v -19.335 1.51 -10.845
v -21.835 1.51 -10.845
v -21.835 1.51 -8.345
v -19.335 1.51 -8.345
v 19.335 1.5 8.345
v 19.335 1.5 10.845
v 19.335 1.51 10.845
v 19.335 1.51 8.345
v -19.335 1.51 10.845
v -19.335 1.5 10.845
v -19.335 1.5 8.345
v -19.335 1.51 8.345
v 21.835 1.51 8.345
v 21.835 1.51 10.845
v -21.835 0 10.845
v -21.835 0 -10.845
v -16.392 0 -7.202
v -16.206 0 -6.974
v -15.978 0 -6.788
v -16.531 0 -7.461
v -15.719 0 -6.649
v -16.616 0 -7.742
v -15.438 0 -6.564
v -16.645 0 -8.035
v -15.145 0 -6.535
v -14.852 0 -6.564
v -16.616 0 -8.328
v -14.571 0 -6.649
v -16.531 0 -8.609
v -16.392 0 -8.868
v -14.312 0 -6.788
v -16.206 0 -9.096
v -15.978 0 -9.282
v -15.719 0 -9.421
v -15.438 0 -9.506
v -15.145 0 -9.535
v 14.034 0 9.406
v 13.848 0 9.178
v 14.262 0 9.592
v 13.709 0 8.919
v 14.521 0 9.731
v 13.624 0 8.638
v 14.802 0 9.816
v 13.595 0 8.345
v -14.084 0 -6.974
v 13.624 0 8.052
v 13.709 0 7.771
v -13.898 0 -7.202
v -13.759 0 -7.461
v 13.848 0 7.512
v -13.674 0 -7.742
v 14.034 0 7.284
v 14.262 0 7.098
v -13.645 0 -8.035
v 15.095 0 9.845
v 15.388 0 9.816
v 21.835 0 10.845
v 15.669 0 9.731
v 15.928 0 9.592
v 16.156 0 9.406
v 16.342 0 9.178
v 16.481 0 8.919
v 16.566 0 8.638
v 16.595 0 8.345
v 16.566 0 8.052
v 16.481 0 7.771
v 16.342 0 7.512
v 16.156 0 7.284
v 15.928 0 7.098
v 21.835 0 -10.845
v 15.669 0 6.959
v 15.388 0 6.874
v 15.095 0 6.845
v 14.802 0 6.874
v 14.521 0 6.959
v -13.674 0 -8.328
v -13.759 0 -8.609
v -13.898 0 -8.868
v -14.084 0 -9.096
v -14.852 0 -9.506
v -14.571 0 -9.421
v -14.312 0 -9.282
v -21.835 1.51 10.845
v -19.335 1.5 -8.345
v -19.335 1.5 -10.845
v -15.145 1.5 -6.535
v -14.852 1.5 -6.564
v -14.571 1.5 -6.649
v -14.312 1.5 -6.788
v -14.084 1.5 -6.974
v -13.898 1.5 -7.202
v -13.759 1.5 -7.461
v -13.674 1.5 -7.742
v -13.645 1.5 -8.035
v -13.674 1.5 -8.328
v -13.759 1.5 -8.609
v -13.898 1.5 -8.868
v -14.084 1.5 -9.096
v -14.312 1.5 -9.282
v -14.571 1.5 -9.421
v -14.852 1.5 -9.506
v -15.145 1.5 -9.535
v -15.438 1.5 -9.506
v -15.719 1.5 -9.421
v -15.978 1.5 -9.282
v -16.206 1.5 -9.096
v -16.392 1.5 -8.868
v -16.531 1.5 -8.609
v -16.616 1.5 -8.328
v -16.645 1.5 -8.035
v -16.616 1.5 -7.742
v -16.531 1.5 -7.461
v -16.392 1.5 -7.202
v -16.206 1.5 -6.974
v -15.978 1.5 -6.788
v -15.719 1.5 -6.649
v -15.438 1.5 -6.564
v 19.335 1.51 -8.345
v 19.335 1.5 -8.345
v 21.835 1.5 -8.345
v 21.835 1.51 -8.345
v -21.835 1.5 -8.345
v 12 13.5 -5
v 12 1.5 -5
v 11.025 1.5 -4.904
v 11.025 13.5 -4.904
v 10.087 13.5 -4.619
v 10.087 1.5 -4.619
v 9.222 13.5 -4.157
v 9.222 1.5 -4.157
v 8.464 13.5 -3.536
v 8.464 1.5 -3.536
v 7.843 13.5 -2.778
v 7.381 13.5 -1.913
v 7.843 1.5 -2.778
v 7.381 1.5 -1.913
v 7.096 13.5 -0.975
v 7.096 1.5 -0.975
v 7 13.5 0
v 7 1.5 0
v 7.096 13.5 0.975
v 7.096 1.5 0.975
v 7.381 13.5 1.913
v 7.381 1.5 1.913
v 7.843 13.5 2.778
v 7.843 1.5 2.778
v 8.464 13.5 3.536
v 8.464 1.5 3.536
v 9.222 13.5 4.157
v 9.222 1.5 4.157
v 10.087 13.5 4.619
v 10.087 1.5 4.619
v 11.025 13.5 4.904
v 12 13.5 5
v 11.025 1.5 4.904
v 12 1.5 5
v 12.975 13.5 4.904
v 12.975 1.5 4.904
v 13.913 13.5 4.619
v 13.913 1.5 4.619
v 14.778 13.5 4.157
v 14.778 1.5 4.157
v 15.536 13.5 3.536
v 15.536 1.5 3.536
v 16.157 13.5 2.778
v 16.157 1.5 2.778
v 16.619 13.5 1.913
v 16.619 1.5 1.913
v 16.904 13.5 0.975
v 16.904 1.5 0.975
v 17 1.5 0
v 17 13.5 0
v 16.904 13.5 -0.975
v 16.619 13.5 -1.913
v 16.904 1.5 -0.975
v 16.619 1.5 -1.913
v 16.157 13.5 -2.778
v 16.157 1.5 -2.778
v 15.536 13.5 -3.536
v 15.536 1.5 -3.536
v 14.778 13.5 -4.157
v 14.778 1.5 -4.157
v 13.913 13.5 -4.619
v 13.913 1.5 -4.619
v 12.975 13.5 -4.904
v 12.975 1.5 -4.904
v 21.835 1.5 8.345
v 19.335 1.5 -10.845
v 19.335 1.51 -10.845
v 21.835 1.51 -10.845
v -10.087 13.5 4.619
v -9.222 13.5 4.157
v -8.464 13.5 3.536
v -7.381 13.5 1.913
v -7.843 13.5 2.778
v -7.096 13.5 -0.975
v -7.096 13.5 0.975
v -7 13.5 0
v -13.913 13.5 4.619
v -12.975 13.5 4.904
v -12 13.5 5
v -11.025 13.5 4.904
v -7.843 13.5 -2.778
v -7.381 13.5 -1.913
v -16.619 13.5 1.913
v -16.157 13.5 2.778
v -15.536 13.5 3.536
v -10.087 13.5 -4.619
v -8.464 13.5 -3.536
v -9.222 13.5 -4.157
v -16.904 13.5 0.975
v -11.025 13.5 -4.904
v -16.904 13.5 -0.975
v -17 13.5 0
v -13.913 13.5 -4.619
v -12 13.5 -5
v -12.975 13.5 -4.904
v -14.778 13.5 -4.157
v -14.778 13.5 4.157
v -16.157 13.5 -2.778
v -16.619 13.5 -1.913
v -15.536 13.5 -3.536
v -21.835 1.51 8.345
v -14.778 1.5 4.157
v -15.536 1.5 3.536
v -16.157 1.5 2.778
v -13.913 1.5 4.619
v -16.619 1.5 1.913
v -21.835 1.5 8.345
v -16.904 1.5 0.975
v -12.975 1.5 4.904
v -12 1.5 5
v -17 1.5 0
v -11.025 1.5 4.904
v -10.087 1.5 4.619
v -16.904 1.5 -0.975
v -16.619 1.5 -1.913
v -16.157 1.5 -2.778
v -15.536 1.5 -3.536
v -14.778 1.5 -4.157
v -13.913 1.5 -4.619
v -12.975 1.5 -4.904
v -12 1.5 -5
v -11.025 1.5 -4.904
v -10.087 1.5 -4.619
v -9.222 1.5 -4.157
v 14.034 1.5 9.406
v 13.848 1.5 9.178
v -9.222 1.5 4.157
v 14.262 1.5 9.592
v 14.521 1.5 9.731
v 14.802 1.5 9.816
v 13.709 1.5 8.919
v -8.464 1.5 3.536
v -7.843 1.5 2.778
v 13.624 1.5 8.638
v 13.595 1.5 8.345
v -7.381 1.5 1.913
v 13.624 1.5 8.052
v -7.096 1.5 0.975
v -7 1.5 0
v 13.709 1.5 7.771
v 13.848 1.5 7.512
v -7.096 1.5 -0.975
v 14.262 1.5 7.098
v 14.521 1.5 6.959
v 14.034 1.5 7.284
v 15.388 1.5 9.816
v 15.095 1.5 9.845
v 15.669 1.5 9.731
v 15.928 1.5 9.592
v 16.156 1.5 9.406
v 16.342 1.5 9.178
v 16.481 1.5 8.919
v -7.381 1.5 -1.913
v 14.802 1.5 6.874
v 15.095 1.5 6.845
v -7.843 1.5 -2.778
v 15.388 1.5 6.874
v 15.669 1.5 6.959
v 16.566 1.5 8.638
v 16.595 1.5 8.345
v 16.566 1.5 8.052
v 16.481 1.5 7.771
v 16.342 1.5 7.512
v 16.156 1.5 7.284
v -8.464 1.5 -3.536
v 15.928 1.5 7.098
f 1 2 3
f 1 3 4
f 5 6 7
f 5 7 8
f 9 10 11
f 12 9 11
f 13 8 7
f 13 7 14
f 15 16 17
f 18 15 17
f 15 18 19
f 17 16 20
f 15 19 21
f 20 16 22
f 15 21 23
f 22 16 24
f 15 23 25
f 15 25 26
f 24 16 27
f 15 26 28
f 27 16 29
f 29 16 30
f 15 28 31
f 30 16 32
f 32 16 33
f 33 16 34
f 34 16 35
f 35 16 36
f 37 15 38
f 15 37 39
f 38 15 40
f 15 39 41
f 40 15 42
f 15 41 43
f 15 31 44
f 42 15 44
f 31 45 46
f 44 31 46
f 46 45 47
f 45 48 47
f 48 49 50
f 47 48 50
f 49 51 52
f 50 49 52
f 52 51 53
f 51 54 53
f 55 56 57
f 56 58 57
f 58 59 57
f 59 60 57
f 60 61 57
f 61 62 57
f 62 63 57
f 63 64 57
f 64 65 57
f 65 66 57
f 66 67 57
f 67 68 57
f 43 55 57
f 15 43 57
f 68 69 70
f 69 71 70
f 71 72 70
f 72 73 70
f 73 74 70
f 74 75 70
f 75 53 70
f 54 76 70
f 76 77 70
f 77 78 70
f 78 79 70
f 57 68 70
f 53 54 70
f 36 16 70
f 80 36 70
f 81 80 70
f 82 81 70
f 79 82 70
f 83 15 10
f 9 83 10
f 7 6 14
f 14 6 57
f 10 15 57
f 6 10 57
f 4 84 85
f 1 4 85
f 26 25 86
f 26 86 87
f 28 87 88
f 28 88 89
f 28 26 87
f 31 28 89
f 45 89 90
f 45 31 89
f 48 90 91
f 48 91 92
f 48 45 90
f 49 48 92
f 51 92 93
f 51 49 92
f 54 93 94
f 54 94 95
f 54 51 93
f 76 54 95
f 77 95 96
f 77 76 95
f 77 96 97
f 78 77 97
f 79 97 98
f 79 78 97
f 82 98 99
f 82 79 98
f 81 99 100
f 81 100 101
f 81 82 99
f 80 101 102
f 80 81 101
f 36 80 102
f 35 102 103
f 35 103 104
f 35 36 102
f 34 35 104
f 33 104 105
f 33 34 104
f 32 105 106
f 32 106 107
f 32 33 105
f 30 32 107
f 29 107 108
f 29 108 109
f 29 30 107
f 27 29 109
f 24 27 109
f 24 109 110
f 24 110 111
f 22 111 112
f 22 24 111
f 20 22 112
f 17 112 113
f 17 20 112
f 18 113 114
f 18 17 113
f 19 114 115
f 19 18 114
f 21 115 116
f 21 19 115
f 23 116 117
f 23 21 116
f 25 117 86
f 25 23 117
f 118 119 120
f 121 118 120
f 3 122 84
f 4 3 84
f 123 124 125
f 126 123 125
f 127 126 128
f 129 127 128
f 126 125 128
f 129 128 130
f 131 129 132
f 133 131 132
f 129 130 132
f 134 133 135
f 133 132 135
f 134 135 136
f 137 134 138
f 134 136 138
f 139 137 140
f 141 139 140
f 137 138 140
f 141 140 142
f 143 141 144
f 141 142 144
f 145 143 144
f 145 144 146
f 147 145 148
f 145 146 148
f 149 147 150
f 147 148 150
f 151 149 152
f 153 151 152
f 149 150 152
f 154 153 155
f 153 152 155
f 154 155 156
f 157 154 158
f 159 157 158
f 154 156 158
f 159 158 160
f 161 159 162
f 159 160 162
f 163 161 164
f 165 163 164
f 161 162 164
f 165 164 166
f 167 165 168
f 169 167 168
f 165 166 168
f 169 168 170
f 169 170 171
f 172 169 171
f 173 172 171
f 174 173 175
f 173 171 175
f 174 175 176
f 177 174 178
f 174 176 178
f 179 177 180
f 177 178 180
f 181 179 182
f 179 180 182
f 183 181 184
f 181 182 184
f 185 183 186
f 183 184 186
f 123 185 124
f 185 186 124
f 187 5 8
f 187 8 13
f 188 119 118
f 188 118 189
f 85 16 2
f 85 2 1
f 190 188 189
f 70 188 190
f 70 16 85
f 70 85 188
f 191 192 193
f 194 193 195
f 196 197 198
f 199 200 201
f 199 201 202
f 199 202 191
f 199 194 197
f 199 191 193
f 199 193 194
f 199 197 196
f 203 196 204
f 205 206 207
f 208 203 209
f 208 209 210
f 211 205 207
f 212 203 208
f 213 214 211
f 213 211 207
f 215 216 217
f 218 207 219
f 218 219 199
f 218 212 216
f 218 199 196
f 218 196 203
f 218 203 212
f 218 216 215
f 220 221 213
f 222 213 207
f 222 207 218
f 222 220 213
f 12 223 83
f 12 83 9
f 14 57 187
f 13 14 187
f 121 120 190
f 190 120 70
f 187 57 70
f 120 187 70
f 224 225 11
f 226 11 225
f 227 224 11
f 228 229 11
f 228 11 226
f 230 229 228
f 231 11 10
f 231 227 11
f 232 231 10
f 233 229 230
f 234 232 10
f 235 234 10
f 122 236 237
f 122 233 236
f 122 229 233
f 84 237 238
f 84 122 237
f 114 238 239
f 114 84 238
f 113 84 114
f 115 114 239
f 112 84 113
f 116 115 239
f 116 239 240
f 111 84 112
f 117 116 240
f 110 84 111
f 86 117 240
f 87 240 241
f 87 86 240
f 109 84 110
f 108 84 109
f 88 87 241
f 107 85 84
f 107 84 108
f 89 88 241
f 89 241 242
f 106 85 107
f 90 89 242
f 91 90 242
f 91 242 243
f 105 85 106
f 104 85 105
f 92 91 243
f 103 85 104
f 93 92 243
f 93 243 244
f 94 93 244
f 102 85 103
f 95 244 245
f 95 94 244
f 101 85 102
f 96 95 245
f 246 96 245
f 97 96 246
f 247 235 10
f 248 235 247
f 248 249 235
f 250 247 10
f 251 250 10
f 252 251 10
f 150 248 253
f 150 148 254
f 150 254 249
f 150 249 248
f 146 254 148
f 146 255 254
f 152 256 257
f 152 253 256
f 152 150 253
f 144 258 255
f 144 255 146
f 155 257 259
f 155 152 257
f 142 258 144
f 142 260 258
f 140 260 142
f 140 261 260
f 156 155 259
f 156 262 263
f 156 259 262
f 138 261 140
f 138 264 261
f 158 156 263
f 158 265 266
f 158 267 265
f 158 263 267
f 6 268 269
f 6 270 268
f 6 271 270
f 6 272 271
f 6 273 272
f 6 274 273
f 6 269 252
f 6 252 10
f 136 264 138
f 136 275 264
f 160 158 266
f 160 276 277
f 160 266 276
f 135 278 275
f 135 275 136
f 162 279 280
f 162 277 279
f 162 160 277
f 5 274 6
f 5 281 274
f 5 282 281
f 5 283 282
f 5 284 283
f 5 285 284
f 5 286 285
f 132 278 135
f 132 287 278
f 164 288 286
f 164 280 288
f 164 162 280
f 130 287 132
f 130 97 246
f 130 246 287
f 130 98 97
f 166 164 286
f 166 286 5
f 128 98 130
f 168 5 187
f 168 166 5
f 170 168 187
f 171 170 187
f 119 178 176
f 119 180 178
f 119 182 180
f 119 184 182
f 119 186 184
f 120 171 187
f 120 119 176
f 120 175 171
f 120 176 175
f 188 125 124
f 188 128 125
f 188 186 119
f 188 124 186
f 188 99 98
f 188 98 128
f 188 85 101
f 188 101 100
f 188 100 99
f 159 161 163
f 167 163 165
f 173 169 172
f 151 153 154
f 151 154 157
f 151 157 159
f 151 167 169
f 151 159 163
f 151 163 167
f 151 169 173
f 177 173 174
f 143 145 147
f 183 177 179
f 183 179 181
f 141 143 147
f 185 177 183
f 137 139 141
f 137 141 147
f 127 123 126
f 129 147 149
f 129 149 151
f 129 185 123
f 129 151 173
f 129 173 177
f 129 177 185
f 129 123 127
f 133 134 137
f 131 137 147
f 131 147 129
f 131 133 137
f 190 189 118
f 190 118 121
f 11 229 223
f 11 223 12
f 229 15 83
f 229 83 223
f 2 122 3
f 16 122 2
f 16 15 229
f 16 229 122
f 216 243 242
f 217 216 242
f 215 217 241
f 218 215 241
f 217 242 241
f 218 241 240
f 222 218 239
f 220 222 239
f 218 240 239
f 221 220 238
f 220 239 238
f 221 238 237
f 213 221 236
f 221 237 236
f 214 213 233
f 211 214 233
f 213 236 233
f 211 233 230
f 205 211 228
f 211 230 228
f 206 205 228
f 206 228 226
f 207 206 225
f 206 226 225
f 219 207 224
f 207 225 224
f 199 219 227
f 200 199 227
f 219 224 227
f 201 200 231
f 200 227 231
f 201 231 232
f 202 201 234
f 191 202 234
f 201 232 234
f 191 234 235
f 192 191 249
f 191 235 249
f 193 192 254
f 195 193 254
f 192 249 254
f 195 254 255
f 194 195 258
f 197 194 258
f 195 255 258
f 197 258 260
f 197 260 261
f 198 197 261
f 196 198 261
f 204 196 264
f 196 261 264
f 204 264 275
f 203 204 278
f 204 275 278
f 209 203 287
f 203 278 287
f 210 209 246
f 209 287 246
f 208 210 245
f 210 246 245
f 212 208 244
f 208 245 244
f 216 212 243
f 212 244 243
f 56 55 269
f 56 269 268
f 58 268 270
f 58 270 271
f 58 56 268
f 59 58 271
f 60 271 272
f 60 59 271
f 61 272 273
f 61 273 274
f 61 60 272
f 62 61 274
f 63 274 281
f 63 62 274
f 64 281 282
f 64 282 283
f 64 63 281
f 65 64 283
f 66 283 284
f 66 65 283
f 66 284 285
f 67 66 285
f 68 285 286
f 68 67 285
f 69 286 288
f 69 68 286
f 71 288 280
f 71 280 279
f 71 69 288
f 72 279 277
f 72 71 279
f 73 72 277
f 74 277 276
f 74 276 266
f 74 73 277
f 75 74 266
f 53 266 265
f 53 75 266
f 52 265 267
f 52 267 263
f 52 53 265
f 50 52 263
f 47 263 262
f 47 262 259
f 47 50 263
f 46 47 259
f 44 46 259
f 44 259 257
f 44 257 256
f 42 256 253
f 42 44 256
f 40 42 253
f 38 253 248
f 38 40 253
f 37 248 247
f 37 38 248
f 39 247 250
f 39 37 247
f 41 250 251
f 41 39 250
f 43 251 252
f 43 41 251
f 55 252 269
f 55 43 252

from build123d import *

# Parameters (mm, degrees)
SKETCH1_W           = 43.67
SKETCH1_H           = 21.69
SKETCH1_R           = 1.5
BOSS_EXTRUDE1_DEPTH = 1.5
SKETCH2_W           = 2.5
SKETCH2_H           = 2.5
BOSS_EXTRUDE2_DEPTH = 0.01
SKETCH3_W           = 2.5
SKETCH3_H           = 2.5
BOSS_EXTRUDE3_DEPTH = 0.01
SKETCH4_R           = 5
BOSS_EXTRUDE4_DEPTH = 12


with BuildPart() as part:
    # Sketch1 → Boss-Extrude1 (new body)
    with BuildSketch(Plane(origin=(0, 0, 0), x_dir=(1, 0, 0), z_dir=(0, 1, 0))):
        Rectangle(SKETCH1_W, SKETCH1_H)
        with Locations(Location((-15.145, 8.035, 0), (0, 0, 270))):
            Circle(SKETCH1_R, mode=Mode.SUBTRACT)
        with Locations(Location((15.095, -8.345, 0), (0, 0, 270))):
            Circle(SKETCH1_R, mode=Mode.SUBTRACT)
    extrude(amount=BOSS_EXTRUDE1_DEPTH)

    # Sketch2 → Boss-Extrude2 (add)
    with BuildSketch(Plane(origin=(0, 1.5, 0), x_dir=(1, 0, 0), z_dir=(0, 1, 0))):
        with Locations((-20.585, 9.595)):
            Rectangle(SKETCH2_W, SKETCH2_H)
        with Locations((-20.585, -9.595)):
            Rectangle(SKETCH2_W, SKETCH2_H)
    extrude(amount=BOSS_EXTRUDE2_DEPTH)

    # Sketch3 → Boss-Extrude3 (add)
    with BuildSketch(Plane(origin=(0, 1.5, 0), x_dir=(1, 0, 0), z_dir=(0, 1, 0))):
        with Locations((20.585, 9.595)):
            Rectangle(SKETCH3_W, SKETCH3_H)
        with Locations((20.585, -9.595)):
            Rectangle(SKETCH3_W, SKETCH3_H)
    extrude(amount=BOSS_EXTRUDE3_DEPTH)

    # Sketch4 → Boss-Extrude4 (add)
    with BuildSketch(Plane(origin=(0, 1.5, 0), x_dir=(1, 0, 0), z_dir=(0, 1, 0))):
        with Locations(Location((-12, 0, 0), (0, 0, 90))):
            Circle(SKETCH4_R)
        with Locations(Location((12, 0, 0), (0, 0, 90))):
            Circle(SKETCH4_R)
    extrude(amount=BOSS_EXTRUDE4_DEPTH)


solid = part.part
